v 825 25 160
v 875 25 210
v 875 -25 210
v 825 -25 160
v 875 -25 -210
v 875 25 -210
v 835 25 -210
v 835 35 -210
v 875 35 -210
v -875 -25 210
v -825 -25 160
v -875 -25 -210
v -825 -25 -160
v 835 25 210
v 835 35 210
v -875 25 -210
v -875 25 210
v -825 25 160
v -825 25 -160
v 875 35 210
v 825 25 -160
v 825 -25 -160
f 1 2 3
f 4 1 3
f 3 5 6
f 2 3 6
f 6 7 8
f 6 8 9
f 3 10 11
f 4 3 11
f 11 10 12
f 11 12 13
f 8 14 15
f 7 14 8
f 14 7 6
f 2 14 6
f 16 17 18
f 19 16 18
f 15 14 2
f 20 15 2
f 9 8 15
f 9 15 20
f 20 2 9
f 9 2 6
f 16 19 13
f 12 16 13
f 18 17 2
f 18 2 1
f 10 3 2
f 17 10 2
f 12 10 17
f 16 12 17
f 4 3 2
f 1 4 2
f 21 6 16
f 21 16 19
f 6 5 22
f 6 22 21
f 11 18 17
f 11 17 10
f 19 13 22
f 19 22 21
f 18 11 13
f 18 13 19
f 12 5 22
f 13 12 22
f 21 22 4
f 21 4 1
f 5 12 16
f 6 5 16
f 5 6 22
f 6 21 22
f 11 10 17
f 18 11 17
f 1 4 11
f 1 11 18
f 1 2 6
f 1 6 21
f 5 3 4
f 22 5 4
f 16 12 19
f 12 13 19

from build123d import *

# Parameters (mm, degrees)
SKETCH17_W                            = 50
SKETCH17_H                            = 50
SQUARE_BAR_SQUARE_BAR_50_1_DEPTH      = 406.355339059
SQUARE_BAR_SQUARE_BAR_50_1_DEPTH_BACK = 36.355339059
SKETCH17_ON_SEGMENT_2_W               = 50
SKETCH17_ON_SEGMENT_2_H               = 50
SQUARE_BAR_SQUARE_BAR_50_1_2_DEPTH    = 1772.710678119
SKETCH17_ON_SEGMENT_3_W               = 50
SKETCH17_ON_SEGMENT_3_H               = 50
SQUARE_BAR_SQUARE_BAR_50_1_3_DEPTH    = 442.710678119
SKETCH17_ON_SEGMENT_4_W               = 50
SKETCH17_ON_SEGMENT_4_H               = 50
SQUARE_BAR_SQUARE_BAR_50_1_4_DEPTH    = 1772.710678119
SKETCH_13_W                           = 40
SKETCH_13_H                           = 420
EXTRUDE_2_DEPTH                       = 10


with BuildPart() as part:
    # Sketch17 → Square bar SQUARE BAR 50(1) (new, two sides)
    with BuildSketch(Plane(origin=(-850, 0, -185), x_dir=(1, 0, 0), z_dir=(0, 0, 1))) as square_bar_square_bar_50_1_sk:
        Rectangle(SKETCH17_W, SKETCH17_H)
    extrude(amount=SQUARE_BAR_SQUARE_BAR_50_1_DEPTH)
    extrude(square_bar_square_bar_50_1_sk.sketch, amount=-SQUARE_BAR_SQUARE_BAR_50_1_DEPTH_BACK)

    # Square bar SQUARE BAR 50(1) mitre 1
    split(bisect_by=Plane(origin=(-850, 0, -185), x_dir=(0, -1, 0), z_dir=(-0.707106781, 0, 0.707106781)), keep=Keep.TOP)

    # Square bar SQUARE BAR 50(1) mitre 2
    split(bisect_by=Plane(origin=(-850, 0, 185), x_dir=(0, -1, 0), z_dir=(-0.707106781, 0, -0.707106781)), keep=Keep.TOP)


with BuildPart() as body_2:
    # Sketch17 on segment 2 (carried to segment 2) → Square bar SQUARE BAR 50_1 2 (new body)
    with BuildSketch(Plane(origin=(-886.355339059, 0, 185), x_dir=(0, 0, -1), z_dir=(1, 0, 0))):
        Rectangle(SKETCH17_ON_SEGMENT_2_W, SKETCH17_ON_SEGMENT_2_H)
    extrude(amount=SQUARE_BAR_SQUARE_BAR_50_1_2_DEPTH)

    # Square bar SQUARE BAR 50_1 2 mitre 1
    split(bisect_by=Plane(origin=(-850, 0, 185), x_dir=(0, 1, 0), z_dir=(0.707106781, 0, 0.707106781)), keep=Keep.TOP)

    # Square bar SQUARE BAR 50_1 2 mitre 2
    split(bisect_by=Plane(origin=(850, 0, 185), x_dir=(0, -1, 0), z_dir=(-0.707106781, 0, 0.707106781)), keep=Keep.TOP)


with BuildPart() as body_3:
    # Sketch17 on segment 3 (carried to segment 3) → Square bar SQUARE BAR 50_1 3 (new body)
    with BuildSketch(Plane(origin=(850, 0, 221.355339059), x_dir=(-1, 0, 0), z_dir=(0, 0, -1))):
        Rectangle(SKETCH17_ON_SEGMENT_3_W, SKETCH17_ON_SEGMENT_3_H)
    extrude(amount=SQUARE_BAR_SQUARE_BAR_50_1_3_DEPTH)

    # Square bar SQUARE BAR 50_1 3 mitre 1
    split(bisect_by=Plane(origin=(850, 0, -185), x_dir=(0, 1, 0), z_dir=(0.707106781, 0, 0.707106781)), keep=Keep.TOP)

    # Square bar SQUARE BAR 50_1 3 mitre 2
    split(bisect_by=Plane(origin=(850, 0, 185), x_dir=(0, 1, 0), z_dir=(0.707106781, 0, -0.707106781)), keep=Keep.TOP)


with BuildPart() as body_4:
    # Sketch17 on segment 4 (carried to segment 4) → Square bar SQUARE BAR 50_1 4 (new body)
    with BuildSketch(Plane(origin=(886.355339059, 0, -185), x_dir=(0, 0, 1), z_dir=(-1, 0, 0))):
        Rectangle(SKETCH17_ON_SEGMENT_4_W, SKETCH17_ON_SEGMENT_4_H)
    extrude(amount=SQUARE_BAR_SQUARE_BAR_50_1_4_DEPTH)

    # Square bar SQUARE BAR 50_1 4 mitre 1
    split(bisect_by=Plane(origin=(-850, 0, -185), x_dir=(0, 1, 0), z_dir=(0.707106781, 0, -0.707106781)), keep=Keep.TOP)

    # Square bar SQUARE BAR 50_1 4 mitre 2
    split(bisect_by=Plane(origin=(850, 0, -185), x_dir=(0, -1, 0), z_dir=(-0.707106781, 0, -0.707106781)), keep=Keep.TOP)


with BuildPart() as body_5:
    # 草图13 → 凸台-拉伸2 (new body)
    with BuildSketch(Plane(origin=(0, 25, 0), x_dir=(1, 0, 0), z_dir=(0, 1, 0))):
        with Locations((855, 0)):
            Rectangle(SKETCH_13_W, SKETCH_13_H)
    extrude(amount=EXTRUDE_2_DEPTH)


solid = Compound([part.part, body_2.part, body_3.part, body_4.part, body_5.part])
